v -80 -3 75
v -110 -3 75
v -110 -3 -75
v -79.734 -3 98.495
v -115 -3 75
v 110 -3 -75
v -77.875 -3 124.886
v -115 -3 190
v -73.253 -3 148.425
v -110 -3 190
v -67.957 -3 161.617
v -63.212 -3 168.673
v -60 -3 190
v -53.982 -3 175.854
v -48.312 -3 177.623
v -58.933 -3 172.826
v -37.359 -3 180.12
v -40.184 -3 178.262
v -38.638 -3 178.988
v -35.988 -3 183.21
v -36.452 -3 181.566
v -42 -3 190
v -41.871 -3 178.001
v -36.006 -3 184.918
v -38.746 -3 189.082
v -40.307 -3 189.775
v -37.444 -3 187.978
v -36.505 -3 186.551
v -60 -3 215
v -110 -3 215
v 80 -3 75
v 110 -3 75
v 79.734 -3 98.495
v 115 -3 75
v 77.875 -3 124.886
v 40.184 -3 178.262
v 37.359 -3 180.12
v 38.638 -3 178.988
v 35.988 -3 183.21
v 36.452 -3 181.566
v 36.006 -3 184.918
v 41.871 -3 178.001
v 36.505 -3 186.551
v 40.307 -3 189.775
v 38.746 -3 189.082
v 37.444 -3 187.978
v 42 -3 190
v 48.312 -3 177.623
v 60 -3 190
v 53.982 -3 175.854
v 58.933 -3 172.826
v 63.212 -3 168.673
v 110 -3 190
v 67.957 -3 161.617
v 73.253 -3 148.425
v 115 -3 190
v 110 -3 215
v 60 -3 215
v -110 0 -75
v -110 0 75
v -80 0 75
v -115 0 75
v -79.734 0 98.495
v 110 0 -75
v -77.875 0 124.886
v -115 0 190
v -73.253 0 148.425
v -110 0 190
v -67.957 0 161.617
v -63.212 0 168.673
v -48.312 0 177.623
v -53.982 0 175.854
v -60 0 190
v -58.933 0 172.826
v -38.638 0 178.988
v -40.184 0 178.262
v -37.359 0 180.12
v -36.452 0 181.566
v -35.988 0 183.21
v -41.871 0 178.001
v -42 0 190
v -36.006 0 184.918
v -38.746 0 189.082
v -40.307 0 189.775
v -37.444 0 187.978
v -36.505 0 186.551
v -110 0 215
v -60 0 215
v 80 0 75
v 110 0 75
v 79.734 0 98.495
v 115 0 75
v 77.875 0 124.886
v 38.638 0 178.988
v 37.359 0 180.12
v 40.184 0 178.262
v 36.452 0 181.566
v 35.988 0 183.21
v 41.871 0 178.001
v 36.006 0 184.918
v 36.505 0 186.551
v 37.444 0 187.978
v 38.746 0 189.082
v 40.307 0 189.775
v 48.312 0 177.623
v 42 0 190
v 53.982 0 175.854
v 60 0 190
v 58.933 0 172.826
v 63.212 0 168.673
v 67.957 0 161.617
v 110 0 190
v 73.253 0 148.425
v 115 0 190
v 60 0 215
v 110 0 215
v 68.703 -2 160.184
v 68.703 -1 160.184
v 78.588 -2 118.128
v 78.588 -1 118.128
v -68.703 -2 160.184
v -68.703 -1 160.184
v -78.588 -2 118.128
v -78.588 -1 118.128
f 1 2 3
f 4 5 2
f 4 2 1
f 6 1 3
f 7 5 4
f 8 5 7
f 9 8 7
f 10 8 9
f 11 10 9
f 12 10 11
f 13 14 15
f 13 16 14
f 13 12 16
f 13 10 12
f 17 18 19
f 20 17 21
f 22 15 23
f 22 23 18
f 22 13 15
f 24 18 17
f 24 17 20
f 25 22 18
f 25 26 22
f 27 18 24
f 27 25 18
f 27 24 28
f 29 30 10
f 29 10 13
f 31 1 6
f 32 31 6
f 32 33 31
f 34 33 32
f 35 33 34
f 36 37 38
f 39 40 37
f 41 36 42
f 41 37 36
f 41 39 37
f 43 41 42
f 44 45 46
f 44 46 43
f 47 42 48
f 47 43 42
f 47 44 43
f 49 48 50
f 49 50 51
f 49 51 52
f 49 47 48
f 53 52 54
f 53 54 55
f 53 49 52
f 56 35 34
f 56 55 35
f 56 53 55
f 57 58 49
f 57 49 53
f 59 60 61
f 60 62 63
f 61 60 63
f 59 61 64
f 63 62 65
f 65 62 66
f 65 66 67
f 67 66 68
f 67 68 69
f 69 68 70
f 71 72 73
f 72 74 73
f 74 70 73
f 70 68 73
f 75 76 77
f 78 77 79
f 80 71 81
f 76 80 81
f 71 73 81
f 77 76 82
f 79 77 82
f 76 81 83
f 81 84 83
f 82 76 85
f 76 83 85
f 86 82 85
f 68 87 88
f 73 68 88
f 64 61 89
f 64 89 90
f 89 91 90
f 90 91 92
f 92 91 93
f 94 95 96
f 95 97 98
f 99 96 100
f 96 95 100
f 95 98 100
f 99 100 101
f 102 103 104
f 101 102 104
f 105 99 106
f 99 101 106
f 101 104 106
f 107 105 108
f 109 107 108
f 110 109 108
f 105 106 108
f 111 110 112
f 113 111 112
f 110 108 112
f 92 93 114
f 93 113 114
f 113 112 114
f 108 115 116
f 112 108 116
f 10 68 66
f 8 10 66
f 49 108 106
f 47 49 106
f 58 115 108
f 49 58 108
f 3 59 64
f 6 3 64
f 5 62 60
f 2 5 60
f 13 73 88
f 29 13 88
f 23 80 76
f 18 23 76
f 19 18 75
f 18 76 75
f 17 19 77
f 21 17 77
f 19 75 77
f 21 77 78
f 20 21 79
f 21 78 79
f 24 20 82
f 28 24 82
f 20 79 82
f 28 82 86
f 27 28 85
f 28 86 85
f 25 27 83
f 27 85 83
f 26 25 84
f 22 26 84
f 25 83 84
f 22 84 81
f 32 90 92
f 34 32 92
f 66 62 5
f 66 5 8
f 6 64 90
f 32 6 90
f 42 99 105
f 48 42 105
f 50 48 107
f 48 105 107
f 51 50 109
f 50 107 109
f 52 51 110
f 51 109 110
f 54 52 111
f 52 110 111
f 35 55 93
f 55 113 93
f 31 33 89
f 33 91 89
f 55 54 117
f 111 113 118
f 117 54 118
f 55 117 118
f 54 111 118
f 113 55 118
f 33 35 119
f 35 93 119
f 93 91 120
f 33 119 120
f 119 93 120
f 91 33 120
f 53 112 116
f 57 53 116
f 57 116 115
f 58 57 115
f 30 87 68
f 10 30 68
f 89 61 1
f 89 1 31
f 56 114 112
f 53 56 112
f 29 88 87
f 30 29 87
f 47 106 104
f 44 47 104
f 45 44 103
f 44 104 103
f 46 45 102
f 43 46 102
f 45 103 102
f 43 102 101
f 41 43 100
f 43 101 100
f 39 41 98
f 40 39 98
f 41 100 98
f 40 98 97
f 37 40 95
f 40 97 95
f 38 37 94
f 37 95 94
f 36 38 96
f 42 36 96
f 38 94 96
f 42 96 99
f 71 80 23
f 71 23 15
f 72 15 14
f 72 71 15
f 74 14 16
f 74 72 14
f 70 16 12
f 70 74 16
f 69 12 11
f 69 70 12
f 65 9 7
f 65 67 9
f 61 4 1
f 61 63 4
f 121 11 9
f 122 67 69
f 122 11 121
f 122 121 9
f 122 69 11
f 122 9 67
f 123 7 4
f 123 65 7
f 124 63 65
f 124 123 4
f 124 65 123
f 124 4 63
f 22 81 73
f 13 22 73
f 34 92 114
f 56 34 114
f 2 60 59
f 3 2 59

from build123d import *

# Parameters (mm, degrees)
F0_W     = 30
F0_H     = 115
F0_H_2   = 150
F0_W_2   = 5
F0_W_3   = 160
F1_DEPTH = 3


with BuildPart() as f1:
    # F0 (on Front) → F1 (new body)
    with BuildSketch(Plane.XZ):
        with Locations((-95, 132.5)):
            Rectangle(F0_W, F0_H)
        with Locations((-95, 0)):
            Rectangle(F0_W, F0_H_2)
        with Locations((-112.5, 132.5)):
            Rectangle(F0_W_2, F0_H)
        Rectangle(F0_W_3, F0_H_2)
        with BuildLine():
            Line((-80, 190), (-80, 75))
            add(Edge.make_bspline(
                [(-41.8714651341, 178.0006884036), (-80, 180.026688963), (-80, 110.9410823158), (-80, 75)],
                knots=[0, 0, 0, 0, 109.8313570099, 109.8313570099, 109.8313570099, 109.8313570099], degree=3))
            Line((-41.8714651341, 178.0006884036), (-42, 190))
            Line((-42, 190), (-60, 190))
            Line((-60, 190), (-80, 190))
        make_face()
        Polygon((-110, 215), (-110, 190), (-80, 190), (-60, 190), (-60, 215), align=None)
        with Locations((95, 132.5)):
            Rectangle(F0_W, F0_H)
        with Locations((95, 0)):
            Rectangle(F0_W, F0_H_2)
        with BuildLine():
            add(Edge.make_bspline(
                [(41.8714651341, 178.0006884036), (80, 180.026688963), (80, 110.9410823158), (80, 75)],
                knots=[0, 0, 0, 0, 109.8313570099, 109.8313570099, 109.8313570099, 109.8313570099], degree=3))
            Line((80, 75), (80, 190))
            Line((80, 190), (60, 190))
            Line((60, 190), (42, 190))
            ThreePointArc((42, 190), (35.9360767688, 184.0646116347), (41.8714651341, 178.0006884036))
        make_face()
        with BuildLine():
            Line((-42, 190), (-41.8714651341, 178.0006884036))
            ThreePointArc((-41.8714651341, 178.0006884036), (-35.9360767688, 184.0646116347), (-42, 190))
        make_face()
        with Locations((112.5, 132.5)):
            Rectangle(F0_W_2, F0_H)
        Polygon((60, 190), (80, 190), (110, 190), (110, 215), (60, 215), align=None)
    extrude(amount=F1_DEPTH)


solid = f1.part
